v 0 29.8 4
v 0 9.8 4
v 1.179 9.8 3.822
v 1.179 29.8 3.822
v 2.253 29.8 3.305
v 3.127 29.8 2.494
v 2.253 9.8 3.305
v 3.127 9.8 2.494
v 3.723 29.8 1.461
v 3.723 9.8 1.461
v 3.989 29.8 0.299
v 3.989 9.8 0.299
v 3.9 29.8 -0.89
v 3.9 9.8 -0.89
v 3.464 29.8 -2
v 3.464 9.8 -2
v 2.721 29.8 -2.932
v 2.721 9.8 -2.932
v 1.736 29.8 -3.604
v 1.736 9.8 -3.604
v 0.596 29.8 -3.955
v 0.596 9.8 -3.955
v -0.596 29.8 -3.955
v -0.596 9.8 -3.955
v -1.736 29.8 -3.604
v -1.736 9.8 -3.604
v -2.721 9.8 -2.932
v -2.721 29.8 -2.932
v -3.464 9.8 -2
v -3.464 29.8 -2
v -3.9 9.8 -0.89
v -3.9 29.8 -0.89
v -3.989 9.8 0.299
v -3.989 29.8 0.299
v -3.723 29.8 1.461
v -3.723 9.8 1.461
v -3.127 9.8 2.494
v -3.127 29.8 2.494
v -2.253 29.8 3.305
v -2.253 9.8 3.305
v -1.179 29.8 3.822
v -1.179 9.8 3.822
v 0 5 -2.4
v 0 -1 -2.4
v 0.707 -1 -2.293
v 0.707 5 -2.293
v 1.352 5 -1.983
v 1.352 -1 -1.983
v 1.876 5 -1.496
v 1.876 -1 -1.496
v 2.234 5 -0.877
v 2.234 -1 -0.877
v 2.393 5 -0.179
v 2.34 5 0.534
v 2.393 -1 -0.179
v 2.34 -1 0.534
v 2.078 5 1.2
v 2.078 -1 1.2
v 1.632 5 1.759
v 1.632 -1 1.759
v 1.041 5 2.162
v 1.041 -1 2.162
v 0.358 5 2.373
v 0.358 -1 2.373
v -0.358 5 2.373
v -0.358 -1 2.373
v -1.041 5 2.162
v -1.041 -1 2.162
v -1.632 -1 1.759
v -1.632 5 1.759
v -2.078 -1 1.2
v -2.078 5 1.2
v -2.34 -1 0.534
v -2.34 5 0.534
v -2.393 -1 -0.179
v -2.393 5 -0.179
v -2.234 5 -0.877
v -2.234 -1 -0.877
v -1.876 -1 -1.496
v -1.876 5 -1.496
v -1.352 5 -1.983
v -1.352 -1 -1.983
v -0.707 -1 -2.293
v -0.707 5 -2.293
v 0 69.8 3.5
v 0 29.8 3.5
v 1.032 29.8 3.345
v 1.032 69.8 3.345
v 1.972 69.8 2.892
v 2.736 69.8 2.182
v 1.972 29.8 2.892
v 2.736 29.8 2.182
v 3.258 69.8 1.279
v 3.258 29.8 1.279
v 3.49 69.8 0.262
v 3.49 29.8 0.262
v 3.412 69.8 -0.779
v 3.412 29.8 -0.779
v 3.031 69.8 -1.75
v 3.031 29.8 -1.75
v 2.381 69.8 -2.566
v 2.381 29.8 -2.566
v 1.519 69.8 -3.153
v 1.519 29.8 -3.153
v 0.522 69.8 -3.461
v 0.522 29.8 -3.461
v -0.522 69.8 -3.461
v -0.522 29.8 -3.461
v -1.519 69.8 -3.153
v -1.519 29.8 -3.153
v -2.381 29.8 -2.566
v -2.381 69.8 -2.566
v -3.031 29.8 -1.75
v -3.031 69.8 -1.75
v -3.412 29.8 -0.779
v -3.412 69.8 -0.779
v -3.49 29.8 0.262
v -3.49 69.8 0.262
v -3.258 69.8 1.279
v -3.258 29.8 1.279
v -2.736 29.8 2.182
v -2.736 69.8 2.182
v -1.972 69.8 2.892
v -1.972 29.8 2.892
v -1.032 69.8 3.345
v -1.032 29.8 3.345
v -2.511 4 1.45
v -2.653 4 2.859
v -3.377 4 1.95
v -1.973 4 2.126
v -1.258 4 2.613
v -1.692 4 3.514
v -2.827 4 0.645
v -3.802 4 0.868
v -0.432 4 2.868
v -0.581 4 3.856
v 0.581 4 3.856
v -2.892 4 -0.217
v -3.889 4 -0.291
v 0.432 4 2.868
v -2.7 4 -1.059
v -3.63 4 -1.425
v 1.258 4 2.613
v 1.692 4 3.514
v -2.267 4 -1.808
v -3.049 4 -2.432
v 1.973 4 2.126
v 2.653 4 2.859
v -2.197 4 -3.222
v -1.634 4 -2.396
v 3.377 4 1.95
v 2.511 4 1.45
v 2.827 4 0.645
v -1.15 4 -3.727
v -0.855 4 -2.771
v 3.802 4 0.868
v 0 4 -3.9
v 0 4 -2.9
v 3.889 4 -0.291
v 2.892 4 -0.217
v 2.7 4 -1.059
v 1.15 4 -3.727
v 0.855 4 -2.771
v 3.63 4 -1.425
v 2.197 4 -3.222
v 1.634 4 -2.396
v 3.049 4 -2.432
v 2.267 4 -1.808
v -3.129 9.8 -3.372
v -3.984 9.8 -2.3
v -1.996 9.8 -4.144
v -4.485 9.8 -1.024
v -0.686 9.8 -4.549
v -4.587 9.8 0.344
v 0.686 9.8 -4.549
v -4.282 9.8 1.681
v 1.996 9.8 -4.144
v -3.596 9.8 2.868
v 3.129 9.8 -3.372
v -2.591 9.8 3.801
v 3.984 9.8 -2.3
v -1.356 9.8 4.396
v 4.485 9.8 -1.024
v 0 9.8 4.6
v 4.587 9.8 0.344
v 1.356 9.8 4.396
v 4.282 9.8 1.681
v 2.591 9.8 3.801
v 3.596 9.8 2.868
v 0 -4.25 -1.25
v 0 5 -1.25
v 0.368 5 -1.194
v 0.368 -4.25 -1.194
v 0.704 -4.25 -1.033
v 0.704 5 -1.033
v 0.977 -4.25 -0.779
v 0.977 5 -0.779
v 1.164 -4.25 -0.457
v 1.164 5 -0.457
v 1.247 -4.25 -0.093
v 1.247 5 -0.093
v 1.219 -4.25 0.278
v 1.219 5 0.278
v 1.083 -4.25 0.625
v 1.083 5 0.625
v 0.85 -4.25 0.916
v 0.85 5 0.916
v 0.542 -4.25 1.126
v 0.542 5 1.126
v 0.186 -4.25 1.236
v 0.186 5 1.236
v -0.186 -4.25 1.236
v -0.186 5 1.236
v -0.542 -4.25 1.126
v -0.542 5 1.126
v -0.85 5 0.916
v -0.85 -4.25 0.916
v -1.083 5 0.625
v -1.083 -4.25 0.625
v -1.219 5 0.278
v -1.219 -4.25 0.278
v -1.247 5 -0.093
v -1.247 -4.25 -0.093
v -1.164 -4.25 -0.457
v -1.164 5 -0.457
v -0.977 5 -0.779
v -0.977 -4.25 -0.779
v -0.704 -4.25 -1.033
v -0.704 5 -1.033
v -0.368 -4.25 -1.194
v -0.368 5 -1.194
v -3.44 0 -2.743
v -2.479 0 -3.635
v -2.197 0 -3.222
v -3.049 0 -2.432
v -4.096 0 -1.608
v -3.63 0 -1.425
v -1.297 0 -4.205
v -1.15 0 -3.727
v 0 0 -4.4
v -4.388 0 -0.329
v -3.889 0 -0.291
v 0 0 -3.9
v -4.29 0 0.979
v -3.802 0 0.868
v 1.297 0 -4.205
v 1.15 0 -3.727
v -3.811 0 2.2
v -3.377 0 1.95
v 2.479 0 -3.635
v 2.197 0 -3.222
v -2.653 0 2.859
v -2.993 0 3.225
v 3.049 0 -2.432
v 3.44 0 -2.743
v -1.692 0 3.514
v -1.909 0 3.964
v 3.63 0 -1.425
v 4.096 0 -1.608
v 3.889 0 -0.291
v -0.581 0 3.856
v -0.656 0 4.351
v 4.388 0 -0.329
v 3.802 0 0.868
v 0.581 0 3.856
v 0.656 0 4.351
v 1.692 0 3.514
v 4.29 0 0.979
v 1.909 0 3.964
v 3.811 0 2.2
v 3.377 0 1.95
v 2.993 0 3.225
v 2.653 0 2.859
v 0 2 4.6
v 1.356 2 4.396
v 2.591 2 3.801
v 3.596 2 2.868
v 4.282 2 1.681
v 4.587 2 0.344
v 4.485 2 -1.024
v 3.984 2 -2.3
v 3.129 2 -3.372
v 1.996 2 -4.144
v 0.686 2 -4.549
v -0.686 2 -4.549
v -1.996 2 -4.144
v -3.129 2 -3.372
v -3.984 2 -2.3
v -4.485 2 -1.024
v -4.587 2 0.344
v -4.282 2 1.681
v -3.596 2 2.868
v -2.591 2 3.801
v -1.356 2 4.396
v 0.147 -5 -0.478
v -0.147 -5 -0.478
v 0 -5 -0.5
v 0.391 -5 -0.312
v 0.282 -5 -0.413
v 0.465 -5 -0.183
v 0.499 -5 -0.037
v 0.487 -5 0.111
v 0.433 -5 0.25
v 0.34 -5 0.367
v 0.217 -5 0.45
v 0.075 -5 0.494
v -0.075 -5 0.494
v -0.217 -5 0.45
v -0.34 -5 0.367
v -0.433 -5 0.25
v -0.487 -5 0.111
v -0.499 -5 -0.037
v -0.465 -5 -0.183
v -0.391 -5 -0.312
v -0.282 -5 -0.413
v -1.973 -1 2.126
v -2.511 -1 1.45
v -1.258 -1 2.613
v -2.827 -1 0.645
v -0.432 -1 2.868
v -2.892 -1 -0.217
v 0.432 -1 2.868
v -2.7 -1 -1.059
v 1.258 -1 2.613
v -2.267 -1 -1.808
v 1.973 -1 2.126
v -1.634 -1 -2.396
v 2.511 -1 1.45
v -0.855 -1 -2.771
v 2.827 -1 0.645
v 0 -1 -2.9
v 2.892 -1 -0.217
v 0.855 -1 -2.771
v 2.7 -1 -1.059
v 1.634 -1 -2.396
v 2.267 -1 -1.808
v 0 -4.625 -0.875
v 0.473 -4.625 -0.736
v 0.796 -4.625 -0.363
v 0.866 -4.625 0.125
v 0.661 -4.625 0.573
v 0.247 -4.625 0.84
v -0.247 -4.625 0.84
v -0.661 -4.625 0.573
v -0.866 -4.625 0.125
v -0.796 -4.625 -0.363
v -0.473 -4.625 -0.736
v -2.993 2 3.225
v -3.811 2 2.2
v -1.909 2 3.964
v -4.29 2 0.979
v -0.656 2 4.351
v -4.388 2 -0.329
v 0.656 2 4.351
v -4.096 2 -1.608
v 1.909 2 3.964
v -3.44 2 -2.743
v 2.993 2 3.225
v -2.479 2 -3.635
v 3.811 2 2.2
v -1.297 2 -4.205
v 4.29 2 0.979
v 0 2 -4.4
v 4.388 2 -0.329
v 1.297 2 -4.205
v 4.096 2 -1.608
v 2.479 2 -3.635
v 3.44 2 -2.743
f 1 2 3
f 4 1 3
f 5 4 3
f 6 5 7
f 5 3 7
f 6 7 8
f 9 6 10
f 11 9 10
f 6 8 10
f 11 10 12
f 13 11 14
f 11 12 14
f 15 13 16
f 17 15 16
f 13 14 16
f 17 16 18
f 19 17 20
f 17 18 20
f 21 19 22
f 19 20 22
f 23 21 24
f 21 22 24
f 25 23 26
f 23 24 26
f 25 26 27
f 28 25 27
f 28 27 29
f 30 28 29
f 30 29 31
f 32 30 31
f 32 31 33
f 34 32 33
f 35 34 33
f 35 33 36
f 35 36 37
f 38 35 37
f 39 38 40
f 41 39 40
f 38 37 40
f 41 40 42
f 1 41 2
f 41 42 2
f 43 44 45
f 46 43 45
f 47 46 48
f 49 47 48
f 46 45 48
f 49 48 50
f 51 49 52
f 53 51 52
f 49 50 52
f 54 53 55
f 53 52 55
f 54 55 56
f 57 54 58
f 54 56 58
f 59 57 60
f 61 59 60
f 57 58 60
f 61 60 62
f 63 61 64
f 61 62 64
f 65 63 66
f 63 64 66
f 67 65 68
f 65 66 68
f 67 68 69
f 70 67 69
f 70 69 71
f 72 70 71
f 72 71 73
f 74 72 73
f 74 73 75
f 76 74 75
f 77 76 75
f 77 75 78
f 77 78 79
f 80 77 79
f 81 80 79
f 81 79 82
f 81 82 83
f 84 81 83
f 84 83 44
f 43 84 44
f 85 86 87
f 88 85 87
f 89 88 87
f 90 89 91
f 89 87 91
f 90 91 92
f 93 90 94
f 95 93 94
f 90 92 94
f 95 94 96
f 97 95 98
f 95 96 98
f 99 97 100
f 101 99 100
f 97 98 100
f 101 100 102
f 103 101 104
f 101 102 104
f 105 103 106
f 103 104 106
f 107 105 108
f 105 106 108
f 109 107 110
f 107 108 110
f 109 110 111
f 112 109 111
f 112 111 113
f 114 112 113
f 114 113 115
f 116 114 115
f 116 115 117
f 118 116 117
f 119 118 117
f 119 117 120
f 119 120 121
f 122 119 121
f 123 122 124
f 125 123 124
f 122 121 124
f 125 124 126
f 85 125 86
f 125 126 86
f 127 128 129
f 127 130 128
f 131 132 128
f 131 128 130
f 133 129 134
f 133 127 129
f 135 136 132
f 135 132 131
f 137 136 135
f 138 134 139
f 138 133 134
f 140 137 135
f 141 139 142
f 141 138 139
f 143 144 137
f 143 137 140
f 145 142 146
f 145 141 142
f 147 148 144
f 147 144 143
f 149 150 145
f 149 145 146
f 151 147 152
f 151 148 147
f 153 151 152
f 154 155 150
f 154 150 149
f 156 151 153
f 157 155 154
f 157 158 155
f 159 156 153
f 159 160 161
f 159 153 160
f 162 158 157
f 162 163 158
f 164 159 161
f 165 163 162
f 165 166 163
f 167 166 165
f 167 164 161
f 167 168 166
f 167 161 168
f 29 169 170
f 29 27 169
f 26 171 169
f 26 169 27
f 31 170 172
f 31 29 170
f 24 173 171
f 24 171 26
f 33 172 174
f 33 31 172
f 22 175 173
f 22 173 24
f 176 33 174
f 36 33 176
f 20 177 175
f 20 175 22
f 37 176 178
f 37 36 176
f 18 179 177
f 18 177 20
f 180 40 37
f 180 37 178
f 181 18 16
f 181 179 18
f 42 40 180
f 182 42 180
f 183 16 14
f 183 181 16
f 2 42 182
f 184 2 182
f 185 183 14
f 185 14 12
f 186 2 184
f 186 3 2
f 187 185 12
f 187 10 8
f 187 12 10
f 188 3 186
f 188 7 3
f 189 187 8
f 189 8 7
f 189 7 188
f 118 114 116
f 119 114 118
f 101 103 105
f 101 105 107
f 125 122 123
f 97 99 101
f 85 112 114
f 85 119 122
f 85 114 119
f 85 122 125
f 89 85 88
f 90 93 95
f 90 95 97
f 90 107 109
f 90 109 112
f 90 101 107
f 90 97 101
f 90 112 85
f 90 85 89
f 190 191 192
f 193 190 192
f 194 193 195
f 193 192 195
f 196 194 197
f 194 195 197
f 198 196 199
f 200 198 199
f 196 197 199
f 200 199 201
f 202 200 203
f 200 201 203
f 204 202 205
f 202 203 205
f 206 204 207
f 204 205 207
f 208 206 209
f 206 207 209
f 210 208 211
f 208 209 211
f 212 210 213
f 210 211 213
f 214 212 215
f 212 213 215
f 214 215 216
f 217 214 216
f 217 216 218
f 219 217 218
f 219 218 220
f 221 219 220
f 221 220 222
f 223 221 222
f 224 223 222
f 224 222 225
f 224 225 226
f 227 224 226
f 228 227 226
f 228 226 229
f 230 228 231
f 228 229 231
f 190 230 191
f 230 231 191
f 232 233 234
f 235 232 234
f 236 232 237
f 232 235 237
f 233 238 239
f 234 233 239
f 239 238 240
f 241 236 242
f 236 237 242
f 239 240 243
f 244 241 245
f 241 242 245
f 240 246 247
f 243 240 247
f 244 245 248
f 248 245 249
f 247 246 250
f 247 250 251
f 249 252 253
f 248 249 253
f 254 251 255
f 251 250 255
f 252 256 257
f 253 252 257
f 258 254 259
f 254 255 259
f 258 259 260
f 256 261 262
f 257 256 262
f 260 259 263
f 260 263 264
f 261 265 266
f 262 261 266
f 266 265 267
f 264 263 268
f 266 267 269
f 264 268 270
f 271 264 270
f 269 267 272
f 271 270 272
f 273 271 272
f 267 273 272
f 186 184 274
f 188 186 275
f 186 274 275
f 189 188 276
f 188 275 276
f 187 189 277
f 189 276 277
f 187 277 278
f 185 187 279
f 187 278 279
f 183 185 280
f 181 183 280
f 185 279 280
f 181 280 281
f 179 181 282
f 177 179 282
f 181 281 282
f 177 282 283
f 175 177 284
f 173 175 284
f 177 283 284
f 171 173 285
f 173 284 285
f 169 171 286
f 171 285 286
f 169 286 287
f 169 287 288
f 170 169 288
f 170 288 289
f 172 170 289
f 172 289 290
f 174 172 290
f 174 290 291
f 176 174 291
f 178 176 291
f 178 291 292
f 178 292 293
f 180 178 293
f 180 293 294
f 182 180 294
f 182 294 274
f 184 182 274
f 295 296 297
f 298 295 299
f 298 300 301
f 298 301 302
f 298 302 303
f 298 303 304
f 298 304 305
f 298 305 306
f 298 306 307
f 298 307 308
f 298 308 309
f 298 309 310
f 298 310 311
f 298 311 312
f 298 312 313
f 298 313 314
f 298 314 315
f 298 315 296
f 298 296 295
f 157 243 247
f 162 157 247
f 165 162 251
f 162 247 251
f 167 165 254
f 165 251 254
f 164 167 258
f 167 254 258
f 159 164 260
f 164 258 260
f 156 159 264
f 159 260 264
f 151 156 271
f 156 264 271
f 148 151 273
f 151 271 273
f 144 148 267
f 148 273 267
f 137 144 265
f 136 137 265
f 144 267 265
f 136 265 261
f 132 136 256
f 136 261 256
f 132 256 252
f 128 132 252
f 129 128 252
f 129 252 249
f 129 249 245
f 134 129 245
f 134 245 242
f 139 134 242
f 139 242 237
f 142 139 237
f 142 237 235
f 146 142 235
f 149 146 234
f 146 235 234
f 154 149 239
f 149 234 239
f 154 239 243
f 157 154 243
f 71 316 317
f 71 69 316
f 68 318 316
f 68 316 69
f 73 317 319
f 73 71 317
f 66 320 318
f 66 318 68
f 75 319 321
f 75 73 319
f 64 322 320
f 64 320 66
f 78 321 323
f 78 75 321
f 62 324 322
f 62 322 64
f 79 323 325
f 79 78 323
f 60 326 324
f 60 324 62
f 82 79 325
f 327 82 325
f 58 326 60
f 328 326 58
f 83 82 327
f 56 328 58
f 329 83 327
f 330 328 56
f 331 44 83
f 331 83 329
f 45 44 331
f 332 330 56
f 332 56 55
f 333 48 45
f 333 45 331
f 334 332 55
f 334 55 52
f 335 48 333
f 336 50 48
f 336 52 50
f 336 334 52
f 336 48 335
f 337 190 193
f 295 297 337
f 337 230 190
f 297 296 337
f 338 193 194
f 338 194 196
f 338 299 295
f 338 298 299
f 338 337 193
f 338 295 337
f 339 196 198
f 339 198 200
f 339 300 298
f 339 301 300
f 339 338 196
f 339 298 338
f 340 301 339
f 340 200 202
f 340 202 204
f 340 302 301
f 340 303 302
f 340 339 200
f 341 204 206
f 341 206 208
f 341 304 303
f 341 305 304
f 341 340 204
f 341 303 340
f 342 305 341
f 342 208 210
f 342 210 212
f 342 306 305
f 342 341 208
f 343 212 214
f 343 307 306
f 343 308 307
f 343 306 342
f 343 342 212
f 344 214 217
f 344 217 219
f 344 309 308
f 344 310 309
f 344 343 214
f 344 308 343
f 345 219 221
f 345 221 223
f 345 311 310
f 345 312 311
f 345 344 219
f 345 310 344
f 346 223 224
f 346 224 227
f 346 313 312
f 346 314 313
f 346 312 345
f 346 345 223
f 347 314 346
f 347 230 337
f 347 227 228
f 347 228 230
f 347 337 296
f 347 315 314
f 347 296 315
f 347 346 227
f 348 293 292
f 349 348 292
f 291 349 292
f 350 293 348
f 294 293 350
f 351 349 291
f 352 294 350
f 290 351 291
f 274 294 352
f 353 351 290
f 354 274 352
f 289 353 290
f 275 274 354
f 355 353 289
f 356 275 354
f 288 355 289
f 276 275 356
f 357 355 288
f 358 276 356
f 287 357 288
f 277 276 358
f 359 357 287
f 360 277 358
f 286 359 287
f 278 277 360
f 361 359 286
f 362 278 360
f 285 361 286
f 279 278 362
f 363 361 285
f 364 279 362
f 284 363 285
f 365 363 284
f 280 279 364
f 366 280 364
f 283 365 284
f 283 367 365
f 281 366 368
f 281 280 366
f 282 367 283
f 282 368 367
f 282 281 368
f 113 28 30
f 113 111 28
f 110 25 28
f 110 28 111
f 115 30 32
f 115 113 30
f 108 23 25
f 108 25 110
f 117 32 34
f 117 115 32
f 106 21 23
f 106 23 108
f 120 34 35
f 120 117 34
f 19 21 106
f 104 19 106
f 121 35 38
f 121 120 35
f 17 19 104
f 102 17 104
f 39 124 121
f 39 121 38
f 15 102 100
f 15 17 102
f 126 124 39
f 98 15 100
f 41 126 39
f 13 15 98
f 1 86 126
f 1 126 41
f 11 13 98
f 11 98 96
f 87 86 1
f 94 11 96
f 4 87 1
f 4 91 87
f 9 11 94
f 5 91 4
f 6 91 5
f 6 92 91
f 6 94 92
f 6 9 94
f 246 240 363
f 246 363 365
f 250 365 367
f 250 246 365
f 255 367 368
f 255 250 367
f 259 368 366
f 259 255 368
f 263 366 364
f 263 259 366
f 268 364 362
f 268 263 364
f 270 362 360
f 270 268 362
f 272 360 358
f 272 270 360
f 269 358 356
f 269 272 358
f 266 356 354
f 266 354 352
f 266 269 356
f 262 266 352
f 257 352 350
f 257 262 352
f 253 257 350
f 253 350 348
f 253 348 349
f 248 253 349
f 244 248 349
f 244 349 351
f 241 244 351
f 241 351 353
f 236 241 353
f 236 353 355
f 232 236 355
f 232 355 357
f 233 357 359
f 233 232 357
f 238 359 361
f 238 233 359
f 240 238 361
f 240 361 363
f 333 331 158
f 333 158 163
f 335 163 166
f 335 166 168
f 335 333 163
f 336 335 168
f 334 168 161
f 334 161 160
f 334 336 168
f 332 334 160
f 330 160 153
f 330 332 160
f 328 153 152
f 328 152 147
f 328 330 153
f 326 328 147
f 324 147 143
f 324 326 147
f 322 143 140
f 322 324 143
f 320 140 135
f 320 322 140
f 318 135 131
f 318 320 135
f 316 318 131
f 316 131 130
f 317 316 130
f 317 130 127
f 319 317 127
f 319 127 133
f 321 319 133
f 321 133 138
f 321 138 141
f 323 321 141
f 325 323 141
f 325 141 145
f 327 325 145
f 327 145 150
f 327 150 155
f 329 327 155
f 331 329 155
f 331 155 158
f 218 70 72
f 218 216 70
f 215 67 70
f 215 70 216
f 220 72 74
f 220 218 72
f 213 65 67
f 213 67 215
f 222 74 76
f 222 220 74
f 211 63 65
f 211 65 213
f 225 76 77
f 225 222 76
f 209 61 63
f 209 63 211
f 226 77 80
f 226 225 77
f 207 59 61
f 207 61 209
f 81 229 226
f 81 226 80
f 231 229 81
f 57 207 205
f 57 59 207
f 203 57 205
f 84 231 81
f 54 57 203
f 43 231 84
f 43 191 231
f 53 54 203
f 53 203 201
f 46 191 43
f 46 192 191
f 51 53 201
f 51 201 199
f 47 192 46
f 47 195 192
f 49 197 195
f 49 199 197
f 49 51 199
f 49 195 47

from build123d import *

# Parameters (mm, degrees)
SKETCH_1_R          = 4.6
EXTRUDE_1_DEPTH     = 9.8
SKETCH_2_R          = 4.6
SKETCH_2_R_2        = 4.4
CUT_EXTRUDE_1_DEPTH = 2
SKETCH_3_R          = 3.9
SKETCH_3_R_2        = 2.9
CUT_EXTRUDE_2_DEPTH = 4
SKETCH_4_R          = 2.4
CUT_EXTRUDE_3_DEPTH = 5
SKETCH_5_R          = 1.25
EXTRUDE_4_DEPTH     = 10
CHAMFER_1_SIZE      = 0.75
EXTRUDE_START       = 1
SKETCH_6_R          = 2.9
SKETCH_6_R_2        = 2.4
EXTRUDE_5_DEPTH     = 1
SKETCH_7_R          = 4
EXTRUDE_6_DEPTH     = 20
SKETCH_8_R          = 3.5
EXTRUDE_7_DEPTH     = 40


with BuildPart() as part:
    # 草图1 → 拉伸1 (new body)
    with BuildSketch(Plane(origin=(0, 0, 0), x_dir=(1, 0, 0), z_dir=(0, 1, 0))):
        with Locations(Location((0, 0, 0), (0, 0, 270))):
            Circle(SKETCH_1_R)
    extrude(amount=EXTRUDE_1_DEPTH)

    # 草图2 → 切除-拉伸1 (cut)
    with BuildSketch(Plane.XZ):
        with Locations(Location((0, 0, 0), (0, 0, 270))):
            Circle(SKETCH_2_R)
        with Locations(Location((0, 0, 0), (0, 0, 270))):
            Circle(SKETCH_2_R_2, mode=Mode.SUBTRACT)
    extrude(amount=-CUT_EXTRUDE_1_DEPTH, mode=Mode.SUBTRACT)

    # 草图3 → 切除-拉伸2 (cut)
    with BuildSketch(Plane.XZ):
        with Locations(Location((0, 0, 0), (0, 0, 270))):
            Circle(SKETCH_3_R)
        with Locations(Location((0, 0, 0), (0, 0, 270))):
            Circle(SKETCH_3_R_2, mode=Mode.SUBTRACT)
    extrude(amount=-CUT_EXTRUDE_2_DEPTH, mode=Mode.SUBTRACT)

    # 草图4 → 切除-拉伸3 (cut)
    with BuildSketch(Plane.XZ):
        with Locations(Location((0, 0, 0), (0, 0, 270))):
            Circle(SKETCH_4_R)
    extrude(amount=-CUT_EXTRUDE_3_DEPTH, mode=Mode.SUBTRACT)

    # 草图5 → 拉伸4 (add)
    with BuildSketch(Plane.XZ.offset(-5)):
        with Locations(Location((0, 0, 0), (0, 0, 270))):
            Circle(SKETCH_5_R)
    extrude(amount=EXTRUDE_4_DEPTH)

    # 倒角1
    chamfer_1_edges = [part.edges().sort_by_distance(p)[0] for p in [
        (0, -5, 1.25),
    ]]
    chamfer(chamfer_1_edges, length=CHAMFER_1_SIZE)

    # 草图6 → 拉伸5 (add)
    with BuildSketch(Plane.XZ.offset(EXTRUDE_START)):
        with Locations(Location((0, 0, 0), (0, 0, 270))):
            Circle(SKETCH_6_R)
        with Locations(Location((0, 0, 0), (0, 0, 270))):
            Circle(SKETCH_6_R_2, mode=Mode.SUBTRACT)
    extrude(amount=-EXTRUDE_5_DEPTH)

    # 草图7 → 拉伸6 (add)
    with BuildSketch(Plane(origin=(0, 9.8, 0), x_dir=(-1, 0, 0), z_dir=(0, 1, 0))):
        with Locations(Location((0, 0, 0), (0, 0, 90))):
            Circle(SKETCH_7_R)
    extrude(amount=EXTRUDE_6_DEPTH)

    # 草图8 → 拉伸7 (add)
    with BuildSketch(Plane(origin=(0, 29.8, 0), x_dir=(-1, 0, 0), z_dir=(0, 1, 0))):
        with Locations(Location((0, 0, 0), (0, 0, 90))):
            Circle(SKETCH_8_R)
    extrude(amount=EXTRUDE_7_DEPTH)


solid = part.part
